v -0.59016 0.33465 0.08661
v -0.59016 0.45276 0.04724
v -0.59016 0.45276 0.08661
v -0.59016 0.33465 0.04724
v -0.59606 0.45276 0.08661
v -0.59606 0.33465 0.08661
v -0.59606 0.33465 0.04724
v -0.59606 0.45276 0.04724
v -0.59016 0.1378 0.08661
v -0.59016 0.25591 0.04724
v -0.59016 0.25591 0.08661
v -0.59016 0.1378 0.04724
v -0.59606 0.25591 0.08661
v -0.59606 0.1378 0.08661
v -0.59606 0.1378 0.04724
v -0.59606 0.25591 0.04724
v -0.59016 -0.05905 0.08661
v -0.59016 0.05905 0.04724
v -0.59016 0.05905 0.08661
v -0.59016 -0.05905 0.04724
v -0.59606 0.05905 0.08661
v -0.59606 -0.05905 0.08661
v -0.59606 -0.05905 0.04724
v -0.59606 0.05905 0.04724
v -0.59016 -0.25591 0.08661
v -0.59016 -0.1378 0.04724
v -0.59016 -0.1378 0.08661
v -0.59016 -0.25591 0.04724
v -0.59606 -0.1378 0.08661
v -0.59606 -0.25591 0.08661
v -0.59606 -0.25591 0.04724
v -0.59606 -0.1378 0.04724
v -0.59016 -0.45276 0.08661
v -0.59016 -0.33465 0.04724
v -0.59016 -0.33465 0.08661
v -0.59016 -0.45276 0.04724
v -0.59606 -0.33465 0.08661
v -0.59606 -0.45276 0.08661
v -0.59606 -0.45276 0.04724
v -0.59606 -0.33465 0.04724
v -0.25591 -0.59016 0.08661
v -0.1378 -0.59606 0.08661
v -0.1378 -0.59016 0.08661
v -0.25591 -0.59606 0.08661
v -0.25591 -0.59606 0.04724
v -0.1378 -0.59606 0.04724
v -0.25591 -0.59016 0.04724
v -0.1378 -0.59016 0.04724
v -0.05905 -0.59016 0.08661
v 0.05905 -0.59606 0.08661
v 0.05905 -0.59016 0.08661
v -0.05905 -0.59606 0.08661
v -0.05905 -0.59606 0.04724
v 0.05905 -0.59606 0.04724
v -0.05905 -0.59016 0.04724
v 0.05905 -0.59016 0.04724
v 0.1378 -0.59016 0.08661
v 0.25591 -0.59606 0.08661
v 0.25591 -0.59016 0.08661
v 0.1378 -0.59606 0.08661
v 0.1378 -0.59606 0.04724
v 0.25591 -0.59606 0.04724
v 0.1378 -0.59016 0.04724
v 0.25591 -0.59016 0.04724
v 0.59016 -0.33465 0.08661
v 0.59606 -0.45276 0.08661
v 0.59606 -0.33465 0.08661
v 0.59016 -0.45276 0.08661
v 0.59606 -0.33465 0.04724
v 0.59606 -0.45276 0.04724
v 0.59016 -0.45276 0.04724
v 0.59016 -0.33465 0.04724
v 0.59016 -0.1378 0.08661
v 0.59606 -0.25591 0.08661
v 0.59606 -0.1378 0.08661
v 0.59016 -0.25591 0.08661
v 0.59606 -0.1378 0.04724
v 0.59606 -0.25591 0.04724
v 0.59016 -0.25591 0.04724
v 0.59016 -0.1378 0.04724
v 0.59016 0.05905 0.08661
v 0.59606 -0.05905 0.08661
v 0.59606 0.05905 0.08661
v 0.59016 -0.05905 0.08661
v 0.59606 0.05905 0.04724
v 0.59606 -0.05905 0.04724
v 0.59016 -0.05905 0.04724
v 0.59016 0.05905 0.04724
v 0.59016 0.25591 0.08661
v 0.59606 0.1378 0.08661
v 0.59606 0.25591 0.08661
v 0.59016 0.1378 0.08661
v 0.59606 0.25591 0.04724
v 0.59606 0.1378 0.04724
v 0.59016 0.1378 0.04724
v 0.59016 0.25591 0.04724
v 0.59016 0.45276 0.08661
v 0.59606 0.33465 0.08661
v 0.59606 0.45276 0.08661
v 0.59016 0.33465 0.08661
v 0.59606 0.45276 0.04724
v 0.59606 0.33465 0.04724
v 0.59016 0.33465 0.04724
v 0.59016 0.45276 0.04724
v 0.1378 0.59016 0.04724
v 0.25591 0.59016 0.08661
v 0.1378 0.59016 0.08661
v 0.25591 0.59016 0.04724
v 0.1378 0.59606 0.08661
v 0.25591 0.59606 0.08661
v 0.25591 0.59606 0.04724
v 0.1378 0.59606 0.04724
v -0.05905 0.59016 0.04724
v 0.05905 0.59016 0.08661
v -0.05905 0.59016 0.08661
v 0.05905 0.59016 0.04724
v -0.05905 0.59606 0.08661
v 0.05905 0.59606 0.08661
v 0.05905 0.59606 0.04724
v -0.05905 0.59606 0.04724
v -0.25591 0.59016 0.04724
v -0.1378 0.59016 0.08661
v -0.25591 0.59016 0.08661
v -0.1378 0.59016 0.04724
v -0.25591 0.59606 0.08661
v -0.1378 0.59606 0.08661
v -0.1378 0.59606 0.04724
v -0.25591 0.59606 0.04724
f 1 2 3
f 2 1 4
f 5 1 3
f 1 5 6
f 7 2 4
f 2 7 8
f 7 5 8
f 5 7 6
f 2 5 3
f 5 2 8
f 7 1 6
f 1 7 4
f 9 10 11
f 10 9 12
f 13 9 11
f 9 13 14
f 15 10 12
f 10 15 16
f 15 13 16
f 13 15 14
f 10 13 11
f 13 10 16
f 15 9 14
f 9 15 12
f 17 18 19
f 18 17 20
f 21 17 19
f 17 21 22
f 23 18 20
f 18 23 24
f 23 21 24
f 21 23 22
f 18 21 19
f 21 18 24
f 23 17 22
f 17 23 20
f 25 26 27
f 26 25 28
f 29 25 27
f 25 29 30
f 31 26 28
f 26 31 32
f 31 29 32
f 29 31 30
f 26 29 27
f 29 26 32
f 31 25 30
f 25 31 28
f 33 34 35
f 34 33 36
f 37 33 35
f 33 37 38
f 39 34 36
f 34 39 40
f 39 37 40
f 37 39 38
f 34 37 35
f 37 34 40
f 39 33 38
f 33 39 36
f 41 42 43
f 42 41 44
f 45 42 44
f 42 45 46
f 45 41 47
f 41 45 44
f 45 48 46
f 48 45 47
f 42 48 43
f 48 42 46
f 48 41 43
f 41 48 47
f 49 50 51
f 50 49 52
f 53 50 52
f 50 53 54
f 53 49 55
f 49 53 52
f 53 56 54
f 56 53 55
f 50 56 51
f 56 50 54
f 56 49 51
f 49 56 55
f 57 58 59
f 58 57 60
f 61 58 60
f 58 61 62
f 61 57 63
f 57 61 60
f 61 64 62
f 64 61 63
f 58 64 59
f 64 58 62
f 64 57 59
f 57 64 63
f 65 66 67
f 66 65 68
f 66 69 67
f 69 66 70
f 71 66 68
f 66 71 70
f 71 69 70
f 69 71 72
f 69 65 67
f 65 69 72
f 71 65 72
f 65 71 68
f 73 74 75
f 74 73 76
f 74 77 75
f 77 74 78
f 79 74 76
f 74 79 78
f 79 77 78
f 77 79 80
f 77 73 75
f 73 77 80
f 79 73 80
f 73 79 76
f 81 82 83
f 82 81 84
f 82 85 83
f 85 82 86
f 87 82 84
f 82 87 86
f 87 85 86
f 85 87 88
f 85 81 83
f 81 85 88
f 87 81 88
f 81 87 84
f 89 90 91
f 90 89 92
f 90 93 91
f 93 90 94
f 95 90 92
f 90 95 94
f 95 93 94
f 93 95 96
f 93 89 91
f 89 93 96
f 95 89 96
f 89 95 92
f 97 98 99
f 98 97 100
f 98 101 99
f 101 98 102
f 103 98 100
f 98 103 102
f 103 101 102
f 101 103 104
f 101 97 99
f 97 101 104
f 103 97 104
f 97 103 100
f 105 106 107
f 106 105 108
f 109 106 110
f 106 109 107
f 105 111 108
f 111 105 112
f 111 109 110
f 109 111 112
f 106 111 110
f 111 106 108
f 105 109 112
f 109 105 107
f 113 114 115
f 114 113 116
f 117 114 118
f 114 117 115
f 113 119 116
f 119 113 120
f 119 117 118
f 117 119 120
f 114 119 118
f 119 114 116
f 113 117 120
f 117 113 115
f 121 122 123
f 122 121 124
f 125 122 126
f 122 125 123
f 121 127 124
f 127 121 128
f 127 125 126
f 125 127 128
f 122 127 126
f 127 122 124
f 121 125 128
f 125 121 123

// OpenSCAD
// file: defines.scad
L = 3.0;  // Длина
W = 3.0;  // Ширина
H = 1.0;  // Высота
Hf = 0.04;  // Возвышение над платой (высота выводов)
e = 0.5;    // Шаг выводов

pin_fragments = 16;

scale = 1/2.54;
// main file
include <defines.scad>

p_w = 0.567;
p_h = 0.3;

p_co = 1.5 - 0.667 + p_w/2;

module Pin(x, y, z, r) {
color("Gold")
  rotate([0,0,r]) translate([x,y,z])
  union() {
    /*Упрощенный вид ног*/
    /*cube(size = [p_w, p_h, Hf],center=true);*/
    /*Оригинальная форма*/
    /*translate([-0.04,0,0.0]) cube(size = [0.4, 0.3, Hf], center=true);
    translate([ 0.14,0,0.0]) cylinder(r = p_h/2, h = Hf, $fn = 64, center=true);
    translate([-0.23,0.1,0.0]) cylinder(r = 0.05, h = Hf, $fn = 64, center=true);
    translate([-0.23,-0.1,0.0]) cylinder(r = 0.05, h = Hf, $fn = 64, center=true);
    translate([-0.23,0,0]) cube(size = [0.1, 0.2, Hf],center=true);*/

    translate([-0.39,0,0.15]) cube(size = [0.015, p_h, 0.1],center=true); // На боковине
  }
}

scale(scale)
  translate([0,0,Hf/2])
  union() {
    Pin(-p_co, 1.0, 0, 0); // #1
    Pin(-p_co, 0.5, 0, 0); // #2
    Pin(-p_co, 0.0, 0, 0); // #3
    Pin(-p_co,-0.5, 0, 0); // #4
    Pin(-p_co,-1.0, 0, 0); // #5

    Pin(-p_co, 0.5, 0, 90); // #6
    Pin(-p_co, 0.0, 0, 90); // #7
    Pin(-p_co,-0.5, 0, 90); // #8

    Pin(-p_co, 1.0, 0, 180); // #9
    Pin(-p_co, 0.5, 0, 180); // #10
    Pin(-p_co, 0.0, 0, 180); // #11
    Pin(-p_co,-0.5, 0, 180); // #12
    Pin(-p_co,-1.0, 0, 180); // #13

    Pin(-p_co, 0.5, 0, 270); // #14
    Pin(-p_co, 0.0, 0, 270); // #15
    Pin(-p_co,-0.5, 0, 270); // #16

  };
